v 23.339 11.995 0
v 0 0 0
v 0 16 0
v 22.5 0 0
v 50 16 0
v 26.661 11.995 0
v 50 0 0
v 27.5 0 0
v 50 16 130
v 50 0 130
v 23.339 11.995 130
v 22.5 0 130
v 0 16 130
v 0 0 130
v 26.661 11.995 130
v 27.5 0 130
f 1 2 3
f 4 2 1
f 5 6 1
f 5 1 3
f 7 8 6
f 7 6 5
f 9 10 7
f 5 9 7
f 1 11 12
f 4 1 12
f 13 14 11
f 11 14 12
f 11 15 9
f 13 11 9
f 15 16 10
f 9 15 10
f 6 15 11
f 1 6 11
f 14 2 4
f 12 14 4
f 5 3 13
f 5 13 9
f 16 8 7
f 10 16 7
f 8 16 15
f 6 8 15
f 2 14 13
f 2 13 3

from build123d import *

# Parameters (mm, degrees)
SKETCH1_W           = 50
SKETCH1_H           = 130
BOSS_EXTRUDE1_DEPTH = 16
CUT_EXTRUDE1_DEPTH  = 167


with BuildPart() as part:
    # Sketch1 → Boss-Extrude1 (new body)
    with BuildSketch(Plane(origin=(0, 0, 0), x_dir=(1, 0, 0), z_dir=(0, 1, 0))):
        with Locations((25, -65)):
            Rectangle(SKETCH1_W, SKETCH1_H)
    extrude(amount=BOSS_EXTRUDE1_DEPTH)

    # Sketch3 → Cut-Extrude1 (cut)
    with BuildSketch(Plane.XY.offset(130)):
        Polygon((22.5, 0), (27.5, 0), (26.661208671, 11.995274858), (23.338791329, 11.995274858), align=None)
    extrude(amount=-CUT_EXTRUDE1_DEPTH, mode=Mode.SUBTRACT)


solid = part.part
